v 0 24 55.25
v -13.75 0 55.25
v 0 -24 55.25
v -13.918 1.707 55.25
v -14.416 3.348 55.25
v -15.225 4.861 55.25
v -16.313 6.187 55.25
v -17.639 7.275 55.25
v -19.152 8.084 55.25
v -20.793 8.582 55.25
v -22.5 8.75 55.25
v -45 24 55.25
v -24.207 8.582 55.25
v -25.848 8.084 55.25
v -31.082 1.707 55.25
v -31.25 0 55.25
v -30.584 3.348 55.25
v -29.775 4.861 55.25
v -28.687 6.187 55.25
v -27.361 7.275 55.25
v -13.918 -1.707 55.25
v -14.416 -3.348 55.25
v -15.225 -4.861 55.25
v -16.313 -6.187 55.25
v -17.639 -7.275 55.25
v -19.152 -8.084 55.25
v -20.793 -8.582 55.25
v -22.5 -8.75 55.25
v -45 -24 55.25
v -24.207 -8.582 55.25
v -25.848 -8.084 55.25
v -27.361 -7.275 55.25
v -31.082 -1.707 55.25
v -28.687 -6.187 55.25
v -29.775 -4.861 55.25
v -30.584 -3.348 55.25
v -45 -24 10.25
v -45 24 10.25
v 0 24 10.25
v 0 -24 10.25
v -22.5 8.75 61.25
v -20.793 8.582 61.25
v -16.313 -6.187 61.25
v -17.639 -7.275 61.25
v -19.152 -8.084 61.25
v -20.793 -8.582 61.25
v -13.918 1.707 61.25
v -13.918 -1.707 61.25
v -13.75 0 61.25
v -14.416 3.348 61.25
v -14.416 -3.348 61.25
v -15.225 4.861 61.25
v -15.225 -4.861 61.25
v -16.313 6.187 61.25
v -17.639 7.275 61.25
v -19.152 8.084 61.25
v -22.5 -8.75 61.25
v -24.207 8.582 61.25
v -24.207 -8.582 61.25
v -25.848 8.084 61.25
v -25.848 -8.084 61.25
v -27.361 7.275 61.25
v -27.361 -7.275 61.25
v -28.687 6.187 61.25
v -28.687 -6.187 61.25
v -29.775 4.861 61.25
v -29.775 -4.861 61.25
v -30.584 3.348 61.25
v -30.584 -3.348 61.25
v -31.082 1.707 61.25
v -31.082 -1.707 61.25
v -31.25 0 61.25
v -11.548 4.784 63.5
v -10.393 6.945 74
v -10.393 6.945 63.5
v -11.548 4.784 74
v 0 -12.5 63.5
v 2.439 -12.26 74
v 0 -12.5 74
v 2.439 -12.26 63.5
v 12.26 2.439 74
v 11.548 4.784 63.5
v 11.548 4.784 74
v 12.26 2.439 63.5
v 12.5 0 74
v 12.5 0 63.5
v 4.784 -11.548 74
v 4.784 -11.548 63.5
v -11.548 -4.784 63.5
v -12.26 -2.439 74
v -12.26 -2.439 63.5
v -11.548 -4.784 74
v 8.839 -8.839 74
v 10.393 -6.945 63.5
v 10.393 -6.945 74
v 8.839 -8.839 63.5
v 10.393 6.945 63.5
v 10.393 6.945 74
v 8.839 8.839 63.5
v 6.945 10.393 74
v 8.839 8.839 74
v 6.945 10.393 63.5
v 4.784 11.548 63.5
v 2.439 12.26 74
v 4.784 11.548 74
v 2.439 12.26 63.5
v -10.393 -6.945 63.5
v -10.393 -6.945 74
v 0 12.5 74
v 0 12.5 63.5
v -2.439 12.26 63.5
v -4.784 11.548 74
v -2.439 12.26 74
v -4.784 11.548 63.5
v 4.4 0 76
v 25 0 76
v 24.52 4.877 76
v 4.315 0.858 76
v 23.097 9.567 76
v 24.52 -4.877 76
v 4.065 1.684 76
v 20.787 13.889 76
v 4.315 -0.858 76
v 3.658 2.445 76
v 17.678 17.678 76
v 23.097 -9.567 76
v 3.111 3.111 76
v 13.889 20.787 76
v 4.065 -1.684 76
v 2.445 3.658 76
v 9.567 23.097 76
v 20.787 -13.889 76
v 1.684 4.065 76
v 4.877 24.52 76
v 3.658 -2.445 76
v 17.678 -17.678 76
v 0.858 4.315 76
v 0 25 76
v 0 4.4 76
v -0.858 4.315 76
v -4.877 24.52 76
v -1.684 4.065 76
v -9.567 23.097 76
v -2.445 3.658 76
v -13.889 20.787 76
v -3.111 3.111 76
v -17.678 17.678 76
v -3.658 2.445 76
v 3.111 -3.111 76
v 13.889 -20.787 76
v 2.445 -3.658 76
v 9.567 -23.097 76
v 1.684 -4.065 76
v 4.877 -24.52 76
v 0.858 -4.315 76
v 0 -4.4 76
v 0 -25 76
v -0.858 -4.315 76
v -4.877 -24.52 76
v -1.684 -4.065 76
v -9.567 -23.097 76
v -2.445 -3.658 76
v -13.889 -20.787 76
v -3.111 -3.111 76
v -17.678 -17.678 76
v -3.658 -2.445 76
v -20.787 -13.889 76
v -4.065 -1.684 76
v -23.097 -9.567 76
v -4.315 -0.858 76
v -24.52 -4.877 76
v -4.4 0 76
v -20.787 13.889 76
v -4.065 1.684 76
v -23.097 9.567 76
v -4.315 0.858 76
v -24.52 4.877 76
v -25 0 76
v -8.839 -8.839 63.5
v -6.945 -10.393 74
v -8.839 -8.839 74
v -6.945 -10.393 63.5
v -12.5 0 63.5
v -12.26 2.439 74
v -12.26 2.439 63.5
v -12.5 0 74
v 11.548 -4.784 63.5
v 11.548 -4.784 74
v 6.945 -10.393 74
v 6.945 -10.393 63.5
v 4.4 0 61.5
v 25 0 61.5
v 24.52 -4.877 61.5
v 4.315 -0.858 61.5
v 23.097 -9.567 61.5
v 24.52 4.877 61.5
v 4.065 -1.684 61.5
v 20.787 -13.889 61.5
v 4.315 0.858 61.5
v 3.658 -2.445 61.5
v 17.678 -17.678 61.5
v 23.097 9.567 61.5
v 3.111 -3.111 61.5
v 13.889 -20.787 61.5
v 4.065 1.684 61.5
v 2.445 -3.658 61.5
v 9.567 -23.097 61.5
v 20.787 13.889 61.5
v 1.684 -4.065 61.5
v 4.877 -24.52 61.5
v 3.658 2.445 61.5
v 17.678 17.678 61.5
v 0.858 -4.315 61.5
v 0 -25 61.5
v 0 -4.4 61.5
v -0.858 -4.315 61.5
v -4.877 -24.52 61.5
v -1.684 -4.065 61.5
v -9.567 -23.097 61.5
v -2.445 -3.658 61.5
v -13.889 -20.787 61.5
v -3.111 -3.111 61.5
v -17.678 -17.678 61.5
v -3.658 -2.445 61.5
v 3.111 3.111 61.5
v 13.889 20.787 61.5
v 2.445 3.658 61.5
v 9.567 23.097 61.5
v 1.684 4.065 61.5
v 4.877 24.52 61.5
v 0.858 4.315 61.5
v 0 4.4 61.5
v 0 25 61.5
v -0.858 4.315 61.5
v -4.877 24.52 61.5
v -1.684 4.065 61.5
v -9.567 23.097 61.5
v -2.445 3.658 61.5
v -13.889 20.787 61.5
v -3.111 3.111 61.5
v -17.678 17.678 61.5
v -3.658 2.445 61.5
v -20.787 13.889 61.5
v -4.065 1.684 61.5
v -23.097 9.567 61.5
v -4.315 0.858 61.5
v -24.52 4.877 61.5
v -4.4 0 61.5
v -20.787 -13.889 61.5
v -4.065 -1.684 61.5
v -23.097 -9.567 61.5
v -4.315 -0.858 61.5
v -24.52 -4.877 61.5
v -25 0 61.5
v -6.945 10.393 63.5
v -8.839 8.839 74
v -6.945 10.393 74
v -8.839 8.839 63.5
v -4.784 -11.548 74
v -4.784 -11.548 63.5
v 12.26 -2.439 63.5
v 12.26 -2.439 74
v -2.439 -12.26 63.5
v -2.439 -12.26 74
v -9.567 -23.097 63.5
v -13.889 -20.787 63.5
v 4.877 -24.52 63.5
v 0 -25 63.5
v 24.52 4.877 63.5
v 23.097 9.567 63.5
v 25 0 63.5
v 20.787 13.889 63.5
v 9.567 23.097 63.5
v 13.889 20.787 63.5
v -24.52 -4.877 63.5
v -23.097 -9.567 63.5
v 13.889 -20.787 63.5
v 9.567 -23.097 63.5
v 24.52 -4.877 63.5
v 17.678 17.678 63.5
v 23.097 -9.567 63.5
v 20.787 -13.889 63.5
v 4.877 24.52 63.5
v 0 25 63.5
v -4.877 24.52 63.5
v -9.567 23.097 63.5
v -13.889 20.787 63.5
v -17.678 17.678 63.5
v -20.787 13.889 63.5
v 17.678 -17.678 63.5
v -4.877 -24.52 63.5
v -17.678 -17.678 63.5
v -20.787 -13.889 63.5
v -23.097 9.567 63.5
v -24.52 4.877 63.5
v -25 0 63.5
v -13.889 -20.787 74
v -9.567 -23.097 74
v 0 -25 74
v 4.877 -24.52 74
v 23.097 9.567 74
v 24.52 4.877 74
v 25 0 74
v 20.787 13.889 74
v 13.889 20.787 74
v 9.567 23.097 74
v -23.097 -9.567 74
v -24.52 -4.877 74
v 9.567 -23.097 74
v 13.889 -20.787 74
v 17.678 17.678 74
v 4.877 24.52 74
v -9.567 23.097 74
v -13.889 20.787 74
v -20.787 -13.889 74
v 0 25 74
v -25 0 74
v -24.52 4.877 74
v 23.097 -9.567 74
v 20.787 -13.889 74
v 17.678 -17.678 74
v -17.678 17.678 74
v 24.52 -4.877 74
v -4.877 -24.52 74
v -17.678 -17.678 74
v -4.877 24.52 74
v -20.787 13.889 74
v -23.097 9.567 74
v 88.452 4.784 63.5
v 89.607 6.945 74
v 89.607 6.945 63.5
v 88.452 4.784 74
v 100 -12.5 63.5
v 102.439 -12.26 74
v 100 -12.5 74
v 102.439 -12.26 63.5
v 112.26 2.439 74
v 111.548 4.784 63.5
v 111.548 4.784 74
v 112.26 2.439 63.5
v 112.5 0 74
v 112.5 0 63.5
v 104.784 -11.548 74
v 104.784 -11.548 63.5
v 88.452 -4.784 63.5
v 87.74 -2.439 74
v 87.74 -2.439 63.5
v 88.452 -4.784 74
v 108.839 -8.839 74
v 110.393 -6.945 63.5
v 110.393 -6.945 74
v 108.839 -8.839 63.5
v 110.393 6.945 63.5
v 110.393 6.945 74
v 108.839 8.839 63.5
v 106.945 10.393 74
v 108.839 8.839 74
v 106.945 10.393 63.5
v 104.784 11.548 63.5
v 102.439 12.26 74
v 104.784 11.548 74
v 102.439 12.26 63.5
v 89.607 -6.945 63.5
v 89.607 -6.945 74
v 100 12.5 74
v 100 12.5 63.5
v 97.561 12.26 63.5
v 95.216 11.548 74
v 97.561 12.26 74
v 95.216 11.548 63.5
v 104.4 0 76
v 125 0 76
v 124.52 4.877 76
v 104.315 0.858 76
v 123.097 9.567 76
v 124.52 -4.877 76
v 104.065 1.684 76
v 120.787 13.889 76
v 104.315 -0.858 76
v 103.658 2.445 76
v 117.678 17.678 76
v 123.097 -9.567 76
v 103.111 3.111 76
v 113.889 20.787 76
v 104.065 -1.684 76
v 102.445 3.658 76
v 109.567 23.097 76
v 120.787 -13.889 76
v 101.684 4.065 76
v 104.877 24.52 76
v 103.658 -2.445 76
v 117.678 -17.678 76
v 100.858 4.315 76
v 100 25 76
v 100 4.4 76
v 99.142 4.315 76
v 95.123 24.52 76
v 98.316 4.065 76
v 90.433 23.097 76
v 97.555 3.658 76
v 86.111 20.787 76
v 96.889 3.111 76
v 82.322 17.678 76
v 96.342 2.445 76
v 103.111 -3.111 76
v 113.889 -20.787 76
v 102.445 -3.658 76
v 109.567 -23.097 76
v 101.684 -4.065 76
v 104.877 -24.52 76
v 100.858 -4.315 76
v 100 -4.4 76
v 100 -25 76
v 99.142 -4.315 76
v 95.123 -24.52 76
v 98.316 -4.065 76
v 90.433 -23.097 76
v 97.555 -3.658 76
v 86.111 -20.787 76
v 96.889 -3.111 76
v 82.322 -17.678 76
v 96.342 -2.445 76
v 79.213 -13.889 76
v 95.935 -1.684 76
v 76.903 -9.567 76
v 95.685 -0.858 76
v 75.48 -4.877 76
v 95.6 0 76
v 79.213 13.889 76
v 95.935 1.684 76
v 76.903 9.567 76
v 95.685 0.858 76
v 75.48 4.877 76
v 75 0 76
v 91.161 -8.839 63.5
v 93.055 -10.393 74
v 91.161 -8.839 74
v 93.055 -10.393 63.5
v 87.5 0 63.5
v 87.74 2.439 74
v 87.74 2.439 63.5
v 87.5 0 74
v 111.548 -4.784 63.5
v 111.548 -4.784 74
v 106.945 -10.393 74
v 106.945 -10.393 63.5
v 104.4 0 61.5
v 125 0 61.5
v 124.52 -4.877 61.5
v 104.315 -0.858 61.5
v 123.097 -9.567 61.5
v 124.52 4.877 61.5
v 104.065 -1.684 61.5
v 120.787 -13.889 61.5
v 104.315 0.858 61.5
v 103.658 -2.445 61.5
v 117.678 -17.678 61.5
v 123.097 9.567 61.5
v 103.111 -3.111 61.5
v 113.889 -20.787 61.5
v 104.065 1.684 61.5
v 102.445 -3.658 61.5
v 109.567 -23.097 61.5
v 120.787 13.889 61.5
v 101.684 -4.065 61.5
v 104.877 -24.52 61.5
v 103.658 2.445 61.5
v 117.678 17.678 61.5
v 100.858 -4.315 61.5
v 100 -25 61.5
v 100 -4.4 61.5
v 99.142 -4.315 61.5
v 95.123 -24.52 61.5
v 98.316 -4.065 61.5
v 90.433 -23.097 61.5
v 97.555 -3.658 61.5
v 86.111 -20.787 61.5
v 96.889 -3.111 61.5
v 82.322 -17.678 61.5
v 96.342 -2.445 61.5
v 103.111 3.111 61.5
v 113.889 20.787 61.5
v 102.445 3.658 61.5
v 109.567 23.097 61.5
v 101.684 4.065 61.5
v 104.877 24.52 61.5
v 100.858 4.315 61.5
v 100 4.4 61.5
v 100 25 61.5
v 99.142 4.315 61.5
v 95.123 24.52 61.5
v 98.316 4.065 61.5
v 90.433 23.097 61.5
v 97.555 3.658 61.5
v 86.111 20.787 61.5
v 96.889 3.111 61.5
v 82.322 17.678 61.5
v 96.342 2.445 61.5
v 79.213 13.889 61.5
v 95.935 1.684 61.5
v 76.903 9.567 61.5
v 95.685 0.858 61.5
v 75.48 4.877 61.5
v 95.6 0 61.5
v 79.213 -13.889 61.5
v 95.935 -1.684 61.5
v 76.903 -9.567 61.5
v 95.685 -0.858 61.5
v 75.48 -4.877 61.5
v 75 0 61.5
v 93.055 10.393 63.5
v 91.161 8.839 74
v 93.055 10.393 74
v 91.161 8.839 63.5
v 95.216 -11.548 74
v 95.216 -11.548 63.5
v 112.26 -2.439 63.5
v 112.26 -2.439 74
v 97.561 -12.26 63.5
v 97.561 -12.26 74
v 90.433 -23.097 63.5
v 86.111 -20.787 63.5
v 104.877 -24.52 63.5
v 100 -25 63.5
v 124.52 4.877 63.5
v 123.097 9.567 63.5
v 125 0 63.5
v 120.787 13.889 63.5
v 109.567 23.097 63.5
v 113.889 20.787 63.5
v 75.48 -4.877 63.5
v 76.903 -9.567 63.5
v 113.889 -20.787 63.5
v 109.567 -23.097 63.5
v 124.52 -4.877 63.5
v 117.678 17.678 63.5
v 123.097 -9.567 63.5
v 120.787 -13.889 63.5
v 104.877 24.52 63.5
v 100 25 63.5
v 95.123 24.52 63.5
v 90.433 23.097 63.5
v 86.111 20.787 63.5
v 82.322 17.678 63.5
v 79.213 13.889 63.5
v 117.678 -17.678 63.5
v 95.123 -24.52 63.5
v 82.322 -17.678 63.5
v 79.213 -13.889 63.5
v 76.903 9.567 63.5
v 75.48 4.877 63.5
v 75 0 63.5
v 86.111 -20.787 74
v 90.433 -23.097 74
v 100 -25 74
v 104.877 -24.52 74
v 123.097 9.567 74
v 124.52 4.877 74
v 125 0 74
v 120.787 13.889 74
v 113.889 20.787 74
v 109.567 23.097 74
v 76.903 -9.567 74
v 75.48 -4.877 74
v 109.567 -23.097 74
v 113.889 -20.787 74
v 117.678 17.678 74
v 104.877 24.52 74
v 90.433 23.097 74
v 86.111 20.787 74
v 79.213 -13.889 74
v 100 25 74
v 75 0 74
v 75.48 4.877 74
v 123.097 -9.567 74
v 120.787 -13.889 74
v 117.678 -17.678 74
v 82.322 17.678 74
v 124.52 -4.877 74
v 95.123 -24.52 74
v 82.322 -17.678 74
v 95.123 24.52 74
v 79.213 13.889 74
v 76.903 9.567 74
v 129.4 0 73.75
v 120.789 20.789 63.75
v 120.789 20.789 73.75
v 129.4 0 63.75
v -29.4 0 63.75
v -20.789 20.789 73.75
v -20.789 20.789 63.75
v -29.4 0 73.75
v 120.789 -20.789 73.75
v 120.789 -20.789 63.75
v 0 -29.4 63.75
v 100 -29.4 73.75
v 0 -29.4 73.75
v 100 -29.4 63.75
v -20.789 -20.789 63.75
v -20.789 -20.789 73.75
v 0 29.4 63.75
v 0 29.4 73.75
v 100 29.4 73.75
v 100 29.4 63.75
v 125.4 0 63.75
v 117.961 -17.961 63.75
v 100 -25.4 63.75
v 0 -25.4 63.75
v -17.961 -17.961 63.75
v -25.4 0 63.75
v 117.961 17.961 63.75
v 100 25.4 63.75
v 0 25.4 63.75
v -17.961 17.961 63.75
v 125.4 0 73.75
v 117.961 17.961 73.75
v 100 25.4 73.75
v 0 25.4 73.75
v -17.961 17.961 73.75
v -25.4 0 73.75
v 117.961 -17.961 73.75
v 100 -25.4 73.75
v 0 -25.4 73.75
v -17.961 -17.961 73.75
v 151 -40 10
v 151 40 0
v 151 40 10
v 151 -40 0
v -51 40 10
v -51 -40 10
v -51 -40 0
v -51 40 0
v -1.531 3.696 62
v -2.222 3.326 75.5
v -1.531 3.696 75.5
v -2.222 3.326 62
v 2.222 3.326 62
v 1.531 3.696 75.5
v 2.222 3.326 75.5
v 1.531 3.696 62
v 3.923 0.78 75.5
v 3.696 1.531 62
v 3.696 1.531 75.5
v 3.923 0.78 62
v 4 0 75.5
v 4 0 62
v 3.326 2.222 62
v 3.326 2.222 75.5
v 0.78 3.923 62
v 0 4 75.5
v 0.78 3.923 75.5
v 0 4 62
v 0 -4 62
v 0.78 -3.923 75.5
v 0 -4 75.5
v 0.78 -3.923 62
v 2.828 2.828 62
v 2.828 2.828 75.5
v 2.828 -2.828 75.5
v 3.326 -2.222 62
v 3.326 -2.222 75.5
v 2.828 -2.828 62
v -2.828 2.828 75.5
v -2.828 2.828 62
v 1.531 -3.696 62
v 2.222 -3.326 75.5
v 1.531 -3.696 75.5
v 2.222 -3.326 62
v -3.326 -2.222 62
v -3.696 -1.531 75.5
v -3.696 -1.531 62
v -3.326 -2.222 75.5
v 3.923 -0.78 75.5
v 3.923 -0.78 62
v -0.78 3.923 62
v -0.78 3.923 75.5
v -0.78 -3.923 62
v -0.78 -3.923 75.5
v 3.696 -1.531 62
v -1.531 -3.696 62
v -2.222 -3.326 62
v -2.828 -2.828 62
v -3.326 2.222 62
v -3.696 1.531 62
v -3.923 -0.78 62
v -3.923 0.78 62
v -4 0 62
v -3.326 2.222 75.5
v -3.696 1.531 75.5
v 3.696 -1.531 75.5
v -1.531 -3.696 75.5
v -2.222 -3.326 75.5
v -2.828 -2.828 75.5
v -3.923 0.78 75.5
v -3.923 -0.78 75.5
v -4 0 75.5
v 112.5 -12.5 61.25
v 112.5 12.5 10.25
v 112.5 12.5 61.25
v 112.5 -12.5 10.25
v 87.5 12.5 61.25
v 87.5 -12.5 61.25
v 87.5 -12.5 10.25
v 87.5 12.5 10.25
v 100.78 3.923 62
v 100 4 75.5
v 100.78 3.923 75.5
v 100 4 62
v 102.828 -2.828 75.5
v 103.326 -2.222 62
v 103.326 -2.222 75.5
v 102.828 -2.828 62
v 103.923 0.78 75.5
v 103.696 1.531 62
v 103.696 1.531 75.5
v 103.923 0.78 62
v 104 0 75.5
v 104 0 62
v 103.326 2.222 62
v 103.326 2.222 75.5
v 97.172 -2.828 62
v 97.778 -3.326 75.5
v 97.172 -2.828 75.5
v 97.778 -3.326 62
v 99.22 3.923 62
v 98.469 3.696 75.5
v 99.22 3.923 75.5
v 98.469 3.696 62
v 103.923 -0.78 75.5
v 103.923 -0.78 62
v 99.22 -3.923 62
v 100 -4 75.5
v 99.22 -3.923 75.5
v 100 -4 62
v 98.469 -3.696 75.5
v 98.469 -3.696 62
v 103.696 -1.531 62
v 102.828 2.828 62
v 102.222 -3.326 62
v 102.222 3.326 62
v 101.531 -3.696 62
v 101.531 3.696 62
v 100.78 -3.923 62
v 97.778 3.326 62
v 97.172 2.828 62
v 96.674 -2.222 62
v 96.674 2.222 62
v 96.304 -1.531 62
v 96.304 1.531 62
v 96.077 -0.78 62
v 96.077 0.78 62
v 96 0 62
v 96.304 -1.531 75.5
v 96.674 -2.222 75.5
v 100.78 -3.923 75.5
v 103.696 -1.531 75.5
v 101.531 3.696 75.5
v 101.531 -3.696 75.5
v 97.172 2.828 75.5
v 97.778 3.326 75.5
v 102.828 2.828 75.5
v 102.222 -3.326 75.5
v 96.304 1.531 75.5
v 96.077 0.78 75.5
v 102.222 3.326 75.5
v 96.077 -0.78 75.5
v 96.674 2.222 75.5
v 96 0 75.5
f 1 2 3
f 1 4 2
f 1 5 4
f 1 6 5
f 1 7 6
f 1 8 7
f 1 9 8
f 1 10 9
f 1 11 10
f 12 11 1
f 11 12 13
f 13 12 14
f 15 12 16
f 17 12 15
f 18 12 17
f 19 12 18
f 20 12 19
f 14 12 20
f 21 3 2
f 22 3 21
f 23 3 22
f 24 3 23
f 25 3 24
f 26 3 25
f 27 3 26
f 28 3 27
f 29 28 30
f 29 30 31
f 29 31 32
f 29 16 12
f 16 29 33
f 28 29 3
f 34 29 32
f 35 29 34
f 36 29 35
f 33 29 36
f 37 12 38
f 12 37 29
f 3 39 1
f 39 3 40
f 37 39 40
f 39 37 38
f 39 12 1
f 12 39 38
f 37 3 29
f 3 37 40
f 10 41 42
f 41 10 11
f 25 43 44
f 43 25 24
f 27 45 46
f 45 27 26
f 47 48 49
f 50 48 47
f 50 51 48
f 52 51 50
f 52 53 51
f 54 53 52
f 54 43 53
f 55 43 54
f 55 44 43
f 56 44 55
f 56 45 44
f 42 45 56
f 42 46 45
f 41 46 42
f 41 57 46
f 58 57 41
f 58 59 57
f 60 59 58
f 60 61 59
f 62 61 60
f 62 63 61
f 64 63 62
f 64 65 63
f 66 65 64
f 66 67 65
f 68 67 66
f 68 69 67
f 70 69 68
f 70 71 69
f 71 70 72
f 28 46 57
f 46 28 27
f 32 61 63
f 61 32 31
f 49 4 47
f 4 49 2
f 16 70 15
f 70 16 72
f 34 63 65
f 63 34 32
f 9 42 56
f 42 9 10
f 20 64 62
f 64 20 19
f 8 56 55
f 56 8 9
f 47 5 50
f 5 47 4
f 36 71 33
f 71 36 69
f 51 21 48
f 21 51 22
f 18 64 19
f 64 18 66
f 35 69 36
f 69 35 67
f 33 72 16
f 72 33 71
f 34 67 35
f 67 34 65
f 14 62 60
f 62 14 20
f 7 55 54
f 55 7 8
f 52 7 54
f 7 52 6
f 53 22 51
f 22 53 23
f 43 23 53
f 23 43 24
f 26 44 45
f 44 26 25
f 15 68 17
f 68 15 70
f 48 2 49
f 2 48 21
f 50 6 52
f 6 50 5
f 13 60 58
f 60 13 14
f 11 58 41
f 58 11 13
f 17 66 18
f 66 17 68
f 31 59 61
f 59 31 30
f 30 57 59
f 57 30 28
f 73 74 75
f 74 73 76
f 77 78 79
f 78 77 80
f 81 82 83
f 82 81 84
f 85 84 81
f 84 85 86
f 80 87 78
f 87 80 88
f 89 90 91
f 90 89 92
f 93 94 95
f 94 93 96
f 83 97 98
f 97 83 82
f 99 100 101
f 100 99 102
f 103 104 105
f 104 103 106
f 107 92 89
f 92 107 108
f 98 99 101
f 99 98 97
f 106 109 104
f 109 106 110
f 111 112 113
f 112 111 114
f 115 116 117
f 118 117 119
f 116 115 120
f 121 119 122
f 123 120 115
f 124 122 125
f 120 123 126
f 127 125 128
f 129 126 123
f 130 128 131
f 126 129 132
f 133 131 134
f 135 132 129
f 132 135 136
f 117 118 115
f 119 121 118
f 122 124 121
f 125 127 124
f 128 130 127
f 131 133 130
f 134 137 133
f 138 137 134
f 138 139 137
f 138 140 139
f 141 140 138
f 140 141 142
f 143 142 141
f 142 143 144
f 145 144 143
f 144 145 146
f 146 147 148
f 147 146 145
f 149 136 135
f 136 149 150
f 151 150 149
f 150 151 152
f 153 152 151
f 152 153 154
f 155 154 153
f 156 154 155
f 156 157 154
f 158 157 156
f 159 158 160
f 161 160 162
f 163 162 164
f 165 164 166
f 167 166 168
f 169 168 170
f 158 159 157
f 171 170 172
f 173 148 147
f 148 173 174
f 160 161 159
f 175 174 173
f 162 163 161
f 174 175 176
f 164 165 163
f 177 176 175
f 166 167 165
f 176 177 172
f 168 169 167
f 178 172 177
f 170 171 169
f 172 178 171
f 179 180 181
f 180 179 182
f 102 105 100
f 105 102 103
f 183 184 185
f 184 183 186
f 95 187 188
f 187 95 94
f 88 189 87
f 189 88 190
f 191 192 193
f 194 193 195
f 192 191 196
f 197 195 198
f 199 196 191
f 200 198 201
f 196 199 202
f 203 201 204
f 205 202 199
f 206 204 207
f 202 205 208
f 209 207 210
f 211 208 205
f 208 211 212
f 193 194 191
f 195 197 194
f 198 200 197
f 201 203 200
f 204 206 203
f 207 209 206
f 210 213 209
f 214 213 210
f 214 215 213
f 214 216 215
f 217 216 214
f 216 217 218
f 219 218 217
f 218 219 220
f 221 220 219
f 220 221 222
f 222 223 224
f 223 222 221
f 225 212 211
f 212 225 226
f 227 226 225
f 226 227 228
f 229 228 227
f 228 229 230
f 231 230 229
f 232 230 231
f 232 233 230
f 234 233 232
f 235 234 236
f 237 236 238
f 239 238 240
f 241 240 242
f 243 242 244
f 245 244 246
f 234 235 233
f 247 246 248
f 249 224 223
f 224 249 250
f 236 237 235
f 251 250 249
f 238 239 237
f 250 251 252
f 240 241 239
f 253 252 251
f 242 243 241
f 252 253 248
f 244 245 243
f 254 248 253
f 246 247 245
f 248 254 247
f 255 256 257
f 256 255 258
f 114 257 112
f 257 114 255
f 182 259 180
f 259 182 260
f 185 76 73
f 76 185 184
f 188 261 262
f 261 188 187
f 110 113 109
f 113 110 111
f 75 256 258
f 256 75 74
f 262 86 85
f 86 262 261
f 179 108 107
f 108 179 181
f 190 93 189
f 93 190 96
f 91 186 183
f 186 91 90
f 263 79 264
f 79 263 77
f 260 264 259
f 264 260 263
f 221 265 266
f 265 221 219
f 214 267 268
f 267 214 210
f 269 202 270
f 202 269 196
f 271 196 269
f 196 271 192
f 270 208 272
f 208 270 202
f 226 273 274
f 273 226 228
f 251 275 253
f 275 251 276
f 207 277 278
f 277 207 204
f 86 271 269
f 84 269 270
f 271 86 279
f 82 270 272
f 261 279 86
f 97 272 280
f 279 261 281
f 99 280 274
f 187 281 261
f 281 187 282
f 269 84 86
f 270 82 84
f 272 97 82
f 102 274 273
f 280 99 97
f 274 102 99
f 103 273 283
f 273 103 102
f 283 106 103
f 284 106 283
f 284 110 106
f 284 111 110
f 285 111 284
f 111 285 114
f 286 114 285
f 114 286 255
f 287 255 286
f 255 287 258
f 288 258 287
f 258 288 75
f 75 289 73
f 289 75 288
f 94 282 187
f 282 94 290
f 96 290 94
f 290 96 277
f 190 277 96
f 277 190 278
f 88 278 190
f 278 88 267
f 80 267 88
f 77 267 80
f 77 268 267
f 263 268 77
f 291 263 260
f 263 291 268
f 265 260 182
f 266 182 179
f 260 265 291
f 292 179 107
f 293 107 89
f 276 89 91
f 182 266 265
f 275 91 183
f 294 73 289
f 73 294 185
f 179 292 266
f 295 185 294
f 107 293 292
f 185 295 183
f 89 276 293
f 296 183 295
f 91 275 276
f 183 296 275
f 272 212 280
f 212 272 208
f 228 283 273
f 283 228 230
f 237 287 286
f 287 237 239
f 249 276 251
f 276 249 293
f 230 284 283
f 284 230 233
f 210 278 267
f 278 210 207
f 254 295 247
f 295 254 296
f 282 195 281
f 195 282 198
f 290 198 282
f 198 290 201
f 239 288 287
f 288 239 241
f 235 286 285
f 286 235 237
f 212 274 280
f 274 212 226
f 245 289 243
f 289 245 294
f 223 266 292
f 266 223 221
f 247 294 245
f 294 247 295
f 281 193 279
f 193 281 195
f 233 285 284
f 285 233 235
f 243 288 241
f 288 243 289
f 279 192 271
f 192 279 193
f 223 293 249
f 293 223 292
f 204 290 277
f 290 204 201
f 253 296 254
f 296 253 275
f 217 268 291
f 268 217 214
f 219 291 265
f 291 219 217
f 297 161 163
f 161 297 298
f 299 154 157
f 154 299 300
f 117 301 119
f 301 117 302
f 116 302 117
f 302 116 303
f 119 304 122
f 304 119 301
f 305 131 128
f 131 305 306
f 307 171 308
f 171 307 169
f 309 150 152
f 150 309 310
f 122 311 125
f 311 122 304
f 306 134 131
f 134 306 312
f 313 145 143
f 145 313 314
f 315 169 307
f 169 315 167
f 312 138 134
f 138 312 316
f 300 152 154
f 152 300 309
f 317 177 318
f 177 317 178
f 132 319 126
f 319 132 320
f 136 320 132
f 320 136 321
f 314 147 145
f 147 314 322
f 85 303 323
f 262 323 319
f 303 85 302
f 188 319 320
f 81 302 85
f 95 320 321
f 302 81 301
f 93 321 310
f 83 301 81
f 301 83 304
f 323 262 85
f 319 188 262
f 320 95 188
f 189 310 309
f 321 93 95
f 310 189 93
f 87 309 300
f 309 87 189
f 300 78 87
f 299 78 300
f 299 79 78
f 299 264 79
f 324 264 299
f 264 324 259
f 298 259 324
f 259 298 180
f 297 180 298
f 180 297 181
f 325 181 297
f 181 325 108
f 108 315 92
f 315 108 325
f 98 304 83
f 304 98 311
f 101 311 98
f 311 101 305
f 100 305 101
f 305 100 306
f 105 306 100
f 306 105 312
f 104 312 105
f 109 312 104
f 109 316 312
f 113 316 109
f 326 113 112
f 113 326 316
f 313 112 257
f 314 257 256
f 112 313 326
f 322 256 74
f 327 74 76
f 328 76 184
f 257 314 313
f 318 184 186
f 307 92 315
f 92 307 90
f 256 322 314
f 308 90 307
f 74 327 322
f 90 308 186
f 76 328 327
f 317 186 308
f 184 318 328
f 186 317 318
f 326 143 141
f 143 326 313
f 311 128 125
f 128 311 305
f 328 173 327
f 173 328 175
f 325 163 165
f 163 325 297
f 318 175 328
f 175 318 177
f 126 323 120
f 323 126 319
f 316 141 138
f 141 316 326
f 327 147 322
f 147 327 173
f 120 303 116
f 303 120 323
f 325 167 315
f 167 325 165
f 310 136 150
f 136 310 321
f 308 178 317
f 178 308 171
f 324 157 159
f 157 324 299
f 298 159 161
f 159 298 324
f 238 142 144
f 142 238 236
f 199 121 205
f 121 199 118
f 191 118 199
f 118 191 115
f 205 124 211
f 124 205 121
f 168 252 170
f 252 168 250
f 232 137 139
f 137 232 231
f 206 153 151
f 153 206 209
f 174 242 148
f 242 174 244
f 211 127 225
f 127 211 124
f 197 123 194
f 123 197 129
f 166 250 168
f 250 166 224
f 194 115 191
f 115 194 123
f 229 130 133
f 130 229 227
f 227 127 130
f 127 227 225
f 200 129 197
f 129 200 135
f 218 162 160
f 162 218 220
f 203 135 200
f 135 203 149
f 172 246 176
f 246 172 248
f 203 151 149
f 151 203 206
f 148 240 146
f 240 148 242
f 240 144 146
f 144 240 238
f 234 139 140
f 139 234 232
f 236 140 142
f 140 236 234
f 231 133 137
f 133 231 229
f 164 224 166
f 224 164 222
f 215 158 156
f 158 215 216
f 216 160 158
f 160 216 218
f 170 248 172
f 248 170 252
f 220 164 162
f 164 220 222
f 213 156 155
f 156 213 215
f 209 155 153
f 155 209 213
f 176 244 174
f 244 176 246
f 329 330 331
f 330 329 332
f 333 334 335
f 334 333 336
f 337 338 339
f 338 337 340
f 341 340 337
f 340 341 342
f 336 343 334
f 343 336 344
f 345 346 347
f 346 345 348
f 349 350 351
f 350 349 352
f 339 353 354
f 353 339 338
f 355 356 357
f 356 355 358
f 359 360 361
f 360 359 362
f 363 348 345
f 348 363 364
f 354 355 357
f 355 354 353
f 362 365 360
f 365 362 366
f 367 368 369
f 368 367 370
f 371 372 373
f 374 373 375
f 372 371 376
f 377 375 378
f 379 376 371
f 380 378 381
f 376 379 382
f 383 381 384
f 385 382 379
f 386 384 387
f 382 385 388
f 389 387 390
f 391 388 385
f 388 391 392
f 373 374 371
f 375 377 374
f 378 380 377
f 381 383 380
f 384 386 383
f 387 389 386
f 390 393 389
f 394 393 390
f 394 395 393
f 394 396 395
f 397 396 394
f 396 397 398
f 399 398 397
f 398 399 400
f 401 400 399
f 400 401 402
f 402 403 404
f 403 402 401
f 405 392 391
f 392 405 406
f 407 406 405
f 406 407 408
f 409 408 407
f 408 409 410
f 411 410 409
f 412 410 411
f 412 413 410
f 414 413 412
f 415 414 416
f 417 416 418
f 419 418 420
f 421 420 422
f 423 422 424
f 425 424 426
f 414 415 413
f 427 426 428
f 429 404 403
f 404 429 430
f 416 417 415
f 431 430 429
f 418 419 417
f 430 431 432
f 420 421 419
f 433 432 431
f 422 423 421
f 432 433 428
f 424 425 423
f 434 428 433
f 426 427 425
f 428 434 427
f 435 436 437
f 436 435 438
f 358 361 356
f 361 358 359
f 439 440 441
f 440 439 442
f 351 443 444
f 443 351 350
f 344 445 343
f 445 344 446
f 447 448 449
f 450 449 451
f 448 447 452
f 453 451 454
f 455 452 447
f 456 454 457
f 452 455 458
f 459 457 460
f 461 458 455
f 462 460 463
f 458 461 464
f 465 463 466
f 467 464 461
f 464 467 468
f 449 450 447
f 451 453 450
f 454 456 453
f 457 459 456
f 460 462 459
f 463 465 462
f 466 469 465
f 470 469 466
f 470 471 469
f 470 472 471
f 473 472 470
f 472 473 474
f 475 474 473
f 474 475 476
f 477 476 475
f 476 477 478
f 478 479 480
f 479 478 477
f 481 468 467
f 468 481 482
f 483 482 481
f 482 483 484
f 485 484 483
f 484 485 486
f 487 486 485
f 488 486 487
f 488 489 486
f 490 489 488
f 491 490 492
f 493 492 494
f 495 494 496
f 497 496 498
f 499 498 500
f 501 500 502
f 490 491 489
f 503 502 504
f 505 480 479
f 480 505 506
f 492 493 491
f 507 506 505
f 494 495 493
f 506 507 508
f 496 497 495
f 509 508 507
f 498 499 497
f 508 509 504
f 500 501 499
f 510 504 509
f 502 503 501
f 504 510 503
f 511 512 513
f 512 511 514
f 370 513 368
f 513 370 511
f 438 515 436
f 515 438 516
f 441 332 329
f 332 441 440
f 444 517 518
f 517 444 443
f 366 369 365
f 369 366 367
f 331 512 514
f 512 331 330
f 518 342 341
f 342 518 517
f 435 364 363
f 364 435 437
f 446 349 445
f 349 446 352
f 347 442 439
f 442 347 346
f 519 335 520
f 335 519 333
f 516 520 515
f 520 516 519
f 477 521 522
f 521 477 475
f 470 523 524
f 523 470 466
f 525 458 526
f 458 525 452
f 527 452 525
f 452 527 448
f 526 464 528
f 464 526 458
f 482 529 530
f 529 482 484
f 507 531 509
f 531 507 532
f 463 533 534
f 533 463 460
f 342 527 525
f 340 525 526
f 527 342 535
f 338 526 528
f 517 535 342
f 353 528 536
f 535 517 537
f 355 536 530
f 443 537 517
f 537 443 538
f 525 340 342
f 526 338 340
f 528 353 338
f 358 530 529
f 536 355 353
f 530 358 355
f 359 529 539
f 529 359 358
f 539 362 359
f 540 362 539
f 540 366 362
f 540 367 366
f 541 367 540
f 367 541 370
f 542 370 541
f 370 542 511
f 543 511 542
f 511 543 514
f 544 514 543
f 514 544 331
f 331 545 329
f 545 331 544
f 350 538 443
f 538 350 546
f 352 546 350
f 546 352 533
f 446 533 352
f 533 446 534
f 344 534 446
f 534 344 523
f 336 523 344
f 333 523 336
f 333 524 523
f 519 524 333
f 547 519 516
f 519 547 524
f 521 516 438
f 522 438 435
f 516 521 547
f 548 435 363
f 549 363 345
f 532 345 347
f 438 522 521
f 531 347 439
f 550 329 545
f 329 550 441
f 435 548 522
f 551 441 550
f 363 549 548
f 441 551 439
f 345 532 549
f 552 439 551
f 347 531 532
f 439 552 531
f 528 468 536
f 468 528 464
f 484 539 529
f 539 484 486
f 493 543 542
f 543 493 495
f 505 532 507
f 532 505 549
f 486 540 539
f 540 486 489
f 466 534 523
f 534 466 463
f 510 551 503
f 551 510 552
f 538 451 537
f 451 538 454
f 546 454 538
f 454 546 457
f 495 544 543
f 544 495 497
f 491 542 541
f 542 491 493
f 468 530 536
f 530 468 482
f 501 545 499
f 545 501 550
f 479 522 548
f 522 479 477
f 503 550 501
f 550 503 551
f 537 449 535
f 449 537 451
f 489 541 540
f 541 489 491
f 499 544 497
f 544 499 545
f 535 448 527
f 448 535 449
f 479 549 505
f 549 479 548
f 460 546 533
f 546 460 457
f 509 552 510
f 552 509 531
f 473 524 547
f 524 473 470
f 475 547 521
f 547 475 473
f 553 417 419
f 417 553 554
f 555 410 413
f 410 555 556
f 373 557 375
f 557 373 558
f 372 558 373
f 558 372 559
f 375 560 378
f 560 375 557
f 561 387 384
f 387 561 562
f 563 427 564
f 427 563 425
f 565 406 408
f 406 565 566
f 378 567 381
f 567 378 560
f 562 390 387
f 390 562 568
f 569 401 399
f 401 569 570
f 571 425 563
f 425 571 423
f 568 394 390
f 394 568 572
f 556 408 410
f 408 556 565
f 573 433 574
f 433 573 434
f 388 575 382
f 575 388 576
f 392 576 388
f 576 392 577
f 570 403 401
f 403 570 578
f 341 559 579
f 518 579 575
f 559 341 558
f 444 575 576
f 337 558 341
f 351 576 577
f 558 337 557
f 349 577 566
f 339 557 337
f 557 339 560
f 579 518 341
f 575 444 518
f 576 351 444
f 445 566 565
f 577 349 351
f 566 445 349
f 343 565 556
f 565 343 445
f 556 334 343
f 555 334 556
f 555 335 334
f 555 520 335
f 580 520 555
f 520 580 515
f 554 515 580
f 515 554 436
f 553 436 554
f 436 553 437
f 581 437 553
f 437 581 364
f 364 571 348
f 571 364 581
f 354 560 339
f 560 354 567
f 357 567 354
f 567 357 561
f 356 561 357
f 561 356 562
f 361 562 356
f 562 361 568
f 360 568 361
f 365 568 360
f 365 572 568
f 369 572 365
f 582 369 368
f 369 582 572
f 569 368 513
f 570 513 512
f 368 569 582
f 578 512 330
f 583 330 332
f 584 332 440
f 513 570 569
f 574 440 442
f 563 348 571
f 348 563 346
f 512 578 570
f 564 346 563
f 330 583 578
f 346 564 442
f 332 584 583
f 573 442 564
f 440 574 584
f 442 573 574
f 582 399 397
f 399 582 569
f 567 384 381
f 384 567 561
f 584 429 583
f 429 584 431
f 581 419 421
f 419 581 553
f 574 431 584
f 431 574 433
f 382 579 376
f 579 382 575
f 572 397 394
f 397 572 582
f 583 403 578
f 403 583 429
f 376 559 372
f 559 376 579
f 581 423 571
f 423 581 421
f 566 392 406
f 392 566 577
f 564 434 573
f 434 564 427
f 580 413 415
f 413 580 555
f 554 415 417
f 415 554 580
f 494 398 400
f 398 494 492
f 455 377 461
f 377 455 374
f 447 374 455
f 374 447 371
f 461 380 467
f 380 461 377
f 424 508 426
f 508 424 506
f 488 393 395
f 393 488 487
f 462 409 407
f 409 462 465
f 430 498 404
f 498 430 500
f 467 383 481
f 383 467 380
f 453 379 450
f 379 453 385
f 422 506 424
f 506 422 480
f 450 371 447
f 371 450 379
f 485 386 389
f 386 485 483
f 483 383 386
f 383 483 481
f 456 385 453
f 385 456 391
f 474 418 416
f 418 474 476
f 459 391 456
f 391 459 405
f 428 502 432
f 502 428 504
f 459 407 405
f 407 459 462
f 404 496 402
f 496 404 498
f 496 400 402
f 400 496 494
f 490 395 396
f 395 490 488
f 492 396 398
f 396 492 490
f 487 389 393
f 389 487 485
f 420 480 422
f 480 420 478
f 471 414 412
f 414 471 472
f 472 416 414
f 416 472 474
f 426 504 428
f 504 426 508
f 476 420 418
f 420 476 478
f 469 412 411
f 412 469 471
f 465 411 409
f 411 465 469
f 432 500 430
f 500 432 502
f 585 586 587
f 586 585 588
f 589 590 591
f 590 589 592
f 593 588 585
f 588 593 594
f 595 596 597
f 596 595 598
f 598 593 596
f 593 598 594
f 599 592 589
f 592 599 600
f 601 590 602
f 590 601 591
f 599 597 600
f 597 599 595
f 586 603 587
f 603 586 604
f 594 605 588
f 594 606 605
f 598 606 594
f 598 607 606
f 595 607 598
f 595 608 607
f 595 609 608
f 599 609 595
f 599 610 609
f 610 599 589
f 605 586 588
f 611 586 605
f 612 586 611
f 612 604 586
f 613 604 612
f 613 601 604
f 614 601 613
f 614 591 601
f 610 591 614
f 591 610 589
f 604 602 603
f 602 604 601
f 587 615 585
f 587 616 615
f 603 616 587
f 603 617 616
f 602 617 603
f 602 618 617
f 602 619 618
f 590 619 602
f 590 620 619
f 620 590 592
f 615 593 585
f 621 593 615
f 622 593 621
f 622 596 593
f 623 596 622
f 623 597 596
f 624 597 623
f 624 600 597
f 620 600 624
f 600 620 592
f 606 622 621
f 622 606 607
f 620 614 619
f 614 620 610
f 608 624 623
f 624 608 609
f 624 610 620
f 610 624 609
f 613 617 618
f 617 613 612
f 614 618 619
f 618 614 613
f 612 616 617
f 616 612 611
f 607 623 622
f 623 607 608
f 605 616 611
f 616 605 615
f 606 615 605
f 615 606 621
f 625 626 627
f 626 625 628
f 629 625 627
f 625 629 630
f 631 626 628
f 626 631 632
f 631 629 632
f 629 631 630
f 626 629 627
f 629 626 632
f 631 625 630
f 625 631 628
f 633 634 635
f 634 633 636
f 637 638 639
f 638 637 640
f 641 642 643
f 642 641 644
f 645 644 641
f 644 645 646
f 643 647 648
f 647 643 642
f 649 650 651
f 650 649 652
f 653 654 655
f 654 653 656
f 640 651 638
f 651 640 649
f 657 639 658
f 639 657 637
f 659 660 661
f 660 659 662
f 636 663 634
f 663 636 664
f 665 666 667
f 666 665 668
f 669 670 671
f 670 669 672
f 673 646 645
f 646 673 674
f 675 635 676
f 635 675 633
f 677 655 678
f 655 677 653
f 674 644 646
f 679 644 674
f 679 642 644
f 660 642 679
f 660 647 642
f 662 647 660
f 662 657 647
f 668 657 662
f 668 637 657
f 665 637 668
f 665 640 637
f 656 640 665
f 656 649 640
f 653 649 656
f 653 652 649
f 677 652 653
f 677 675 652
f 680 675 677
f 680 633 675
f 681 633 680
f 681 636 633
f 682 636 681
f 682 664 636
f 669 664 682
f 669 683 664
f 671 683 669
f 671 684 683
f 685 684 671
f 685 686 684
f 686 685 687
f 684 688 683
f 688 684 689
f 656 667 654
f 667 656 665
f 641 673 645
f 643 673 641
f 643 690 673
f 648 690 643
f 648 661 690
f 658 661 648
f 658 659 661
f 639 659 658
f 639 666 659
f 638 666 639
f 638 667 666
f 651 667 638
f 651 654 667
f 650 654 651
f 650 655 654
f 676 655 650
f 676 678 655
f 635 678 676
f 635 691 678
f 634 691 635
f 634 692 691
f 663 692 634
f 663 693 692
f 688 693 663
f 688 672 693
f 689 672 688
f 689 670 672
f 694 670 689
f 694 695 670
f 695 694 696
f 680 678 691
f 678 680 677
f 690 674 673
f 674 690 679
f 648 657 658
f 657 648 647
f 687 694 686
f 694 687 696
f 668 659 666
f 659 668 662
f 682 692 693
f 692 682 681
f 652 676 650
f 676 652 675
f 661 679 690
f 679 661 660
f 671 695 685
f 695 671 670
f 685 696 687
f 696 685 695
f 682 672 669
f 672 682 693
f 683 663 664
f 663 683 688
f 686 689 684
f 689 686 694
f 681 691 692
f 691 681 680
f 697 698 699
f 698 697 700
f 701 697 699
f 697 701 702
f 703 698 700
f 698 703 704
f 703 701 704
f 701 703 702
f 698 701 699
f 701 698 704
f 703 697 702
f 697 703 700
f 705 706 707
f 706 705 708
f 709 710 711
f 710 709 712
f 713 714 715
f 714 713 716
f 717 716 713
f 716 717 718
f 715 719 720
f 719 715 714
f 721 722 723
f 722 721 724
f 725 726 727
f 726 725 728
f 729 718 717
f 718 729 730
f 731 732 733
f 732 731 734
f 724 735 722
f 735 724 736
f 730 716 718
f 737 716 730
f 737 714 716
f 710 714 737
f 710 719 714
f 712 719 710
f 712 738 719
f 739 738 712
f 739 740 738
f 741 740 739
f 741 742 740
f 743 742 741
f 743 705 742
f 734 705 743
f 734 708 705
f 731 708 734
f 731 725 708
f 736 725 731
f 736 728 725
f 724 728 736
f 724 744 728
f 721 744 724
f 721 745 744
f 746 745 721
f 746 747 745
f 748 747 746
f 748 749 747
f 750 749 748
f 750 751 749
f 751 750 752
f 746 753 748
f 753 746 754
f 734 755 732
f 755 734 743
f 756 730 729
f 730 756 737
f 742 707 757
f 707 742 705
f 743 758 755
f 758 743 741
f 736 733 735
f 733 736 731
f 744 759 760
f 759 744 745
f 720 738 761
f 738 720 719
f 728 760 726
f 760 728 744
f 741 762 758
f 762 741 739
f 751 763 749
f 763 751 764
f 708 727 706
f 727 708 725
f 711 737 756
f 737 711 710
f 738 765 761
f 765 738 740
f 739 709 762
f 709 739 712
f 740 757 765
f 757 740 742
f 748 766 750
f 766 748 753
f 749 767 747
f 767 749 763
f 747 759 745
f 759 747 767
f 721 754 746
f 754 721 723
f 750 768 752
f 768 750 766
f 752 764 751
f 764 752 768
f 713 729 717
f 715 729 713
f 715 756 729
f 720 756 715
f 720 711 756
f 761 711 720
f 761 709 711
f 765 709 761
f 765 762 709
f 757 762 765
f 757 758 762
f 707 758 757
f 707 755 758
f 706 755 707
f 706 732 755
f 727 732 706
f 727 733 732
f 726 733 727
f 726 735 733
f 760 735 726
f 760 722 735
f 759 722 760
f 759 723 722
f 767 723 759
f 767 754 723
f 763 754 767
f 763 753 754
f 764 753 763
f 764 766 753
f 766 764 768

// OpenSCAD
$fn = 32;

// ------------------------------------------------------------------------
// Motor belt drive: span 100 mm, pulleys d50, belt 10 mm wide
// Every part is its own module, assembly() places every instance.
// ------------------------------------------------------------------------

// --- part 1 ---
module base_plate() {
  difference() {
    translate([-101, -40, 0]) cube([202, 80, 10]);
  }
}

// --- part 2 ---
module motor() {
  union() {
    translate([-22.5, -24, 0]) cube([45, 48, 45]);
    translate([25.5, 0, 22.5]) rotate([0, 90, 0]) cylinder(h = 6, d = 17.5, center = true);
  }
}

// --- part 3 ---
module drive_shaft() {
  translate([0, 0, -6.75]) cylinder(h = 13.5, d = 8);
}

// --- part 4 ---
module pulley_drive() {
  difference() {
    union() {
      cylinder(h = 14.5, d = 25);
      cylinder(h = 2, d = 50);
      translate([0, 0, 12.5]) cylinder(h = 2, d = 50);
    }
    translate([0, 0, -1]) cylinder(h = 16.5, d = 8.8);
  }
}

// --- part 5 ---
module idler_post() {
  translate([-12.5, -12.5, 0]) cube([25, 25, 51]);
}

// --- part 6 ---
module driven_shaft() {
  translate([0, 0, -6.75]) cylinder(h = 13.5, d = 8);
}

// --- part 7 ---
module pulley_driven() {
  difference() {
    union() {
      cylinder(h = 14.5, d = 25);
      cylinder(h = 2, d = 50);
      translate([0, 0, 12.5]) cylinder(h = 2, d = 50);
    }
    translate([0, 0, -1]) cylinder(h = 16.5, d = 8.8);
  }
}

// --- part 8 ---
module drive_belt() {
  difference() {
    linear_extrude(height = 10) polygon(points = concat([for (a = [90 : 45 : 270]) [29.4 * cos(a), 29.4 * sin(a)]], [for (a = [270 : 45 : 450]) [100 + 29.4 * cos(a), 29.4 * sin(a)]]));
    translate([0, 0, -1]) linear_extrude(height = 12) polygon(points = concat([for (a = [90 : 45 : 270]) [25.4 * cos(a), 25.4 * sin(a)]], [for (a = [270 : 45 : 450]) [100 + 25.4 * cos(a), 25.4 * sin(a)]]));
  }
}

// --- assembly ---
module assembly() {
  color([0.80, 0.24, 0.20]) translate([50, 0, 0]) rotate([0, 0, 0]) base_plate();
  color([0.20, 0.45, 0.75]) translate([0, 0, 32.75]) rotate([0, 270, 0]) motor();
  color([0.25, 0.62, 0.32]) translate([0, 0, 68.75]) rotate([0, 0, 0]) drive_shaft();
  color([0.92, 0.70, 0.18]) translate([0, 0, 61.5]) rotate([0, 0, 0]) pulley_drive();
  color([0.58, 0.35, 0.70]) translate([100, 0, 10.25]) rotate([0, 0, 0]) idler_post();
  color([0.16, 0.66, 0.66]) translate([100, 0, 68.75]) rotate([0, 0, 0]) driven_shaft();
  color([0.85, 0.48, 0.18]) translate([100, 0, 61.5]) rotate([0, 0, 0]) pulley_driven();
  color([0.55, 0.60, 0.65]) translate([0, 0, 63.75]) rotate([0, 0, 0]) drive_belt();
}

assembly();
